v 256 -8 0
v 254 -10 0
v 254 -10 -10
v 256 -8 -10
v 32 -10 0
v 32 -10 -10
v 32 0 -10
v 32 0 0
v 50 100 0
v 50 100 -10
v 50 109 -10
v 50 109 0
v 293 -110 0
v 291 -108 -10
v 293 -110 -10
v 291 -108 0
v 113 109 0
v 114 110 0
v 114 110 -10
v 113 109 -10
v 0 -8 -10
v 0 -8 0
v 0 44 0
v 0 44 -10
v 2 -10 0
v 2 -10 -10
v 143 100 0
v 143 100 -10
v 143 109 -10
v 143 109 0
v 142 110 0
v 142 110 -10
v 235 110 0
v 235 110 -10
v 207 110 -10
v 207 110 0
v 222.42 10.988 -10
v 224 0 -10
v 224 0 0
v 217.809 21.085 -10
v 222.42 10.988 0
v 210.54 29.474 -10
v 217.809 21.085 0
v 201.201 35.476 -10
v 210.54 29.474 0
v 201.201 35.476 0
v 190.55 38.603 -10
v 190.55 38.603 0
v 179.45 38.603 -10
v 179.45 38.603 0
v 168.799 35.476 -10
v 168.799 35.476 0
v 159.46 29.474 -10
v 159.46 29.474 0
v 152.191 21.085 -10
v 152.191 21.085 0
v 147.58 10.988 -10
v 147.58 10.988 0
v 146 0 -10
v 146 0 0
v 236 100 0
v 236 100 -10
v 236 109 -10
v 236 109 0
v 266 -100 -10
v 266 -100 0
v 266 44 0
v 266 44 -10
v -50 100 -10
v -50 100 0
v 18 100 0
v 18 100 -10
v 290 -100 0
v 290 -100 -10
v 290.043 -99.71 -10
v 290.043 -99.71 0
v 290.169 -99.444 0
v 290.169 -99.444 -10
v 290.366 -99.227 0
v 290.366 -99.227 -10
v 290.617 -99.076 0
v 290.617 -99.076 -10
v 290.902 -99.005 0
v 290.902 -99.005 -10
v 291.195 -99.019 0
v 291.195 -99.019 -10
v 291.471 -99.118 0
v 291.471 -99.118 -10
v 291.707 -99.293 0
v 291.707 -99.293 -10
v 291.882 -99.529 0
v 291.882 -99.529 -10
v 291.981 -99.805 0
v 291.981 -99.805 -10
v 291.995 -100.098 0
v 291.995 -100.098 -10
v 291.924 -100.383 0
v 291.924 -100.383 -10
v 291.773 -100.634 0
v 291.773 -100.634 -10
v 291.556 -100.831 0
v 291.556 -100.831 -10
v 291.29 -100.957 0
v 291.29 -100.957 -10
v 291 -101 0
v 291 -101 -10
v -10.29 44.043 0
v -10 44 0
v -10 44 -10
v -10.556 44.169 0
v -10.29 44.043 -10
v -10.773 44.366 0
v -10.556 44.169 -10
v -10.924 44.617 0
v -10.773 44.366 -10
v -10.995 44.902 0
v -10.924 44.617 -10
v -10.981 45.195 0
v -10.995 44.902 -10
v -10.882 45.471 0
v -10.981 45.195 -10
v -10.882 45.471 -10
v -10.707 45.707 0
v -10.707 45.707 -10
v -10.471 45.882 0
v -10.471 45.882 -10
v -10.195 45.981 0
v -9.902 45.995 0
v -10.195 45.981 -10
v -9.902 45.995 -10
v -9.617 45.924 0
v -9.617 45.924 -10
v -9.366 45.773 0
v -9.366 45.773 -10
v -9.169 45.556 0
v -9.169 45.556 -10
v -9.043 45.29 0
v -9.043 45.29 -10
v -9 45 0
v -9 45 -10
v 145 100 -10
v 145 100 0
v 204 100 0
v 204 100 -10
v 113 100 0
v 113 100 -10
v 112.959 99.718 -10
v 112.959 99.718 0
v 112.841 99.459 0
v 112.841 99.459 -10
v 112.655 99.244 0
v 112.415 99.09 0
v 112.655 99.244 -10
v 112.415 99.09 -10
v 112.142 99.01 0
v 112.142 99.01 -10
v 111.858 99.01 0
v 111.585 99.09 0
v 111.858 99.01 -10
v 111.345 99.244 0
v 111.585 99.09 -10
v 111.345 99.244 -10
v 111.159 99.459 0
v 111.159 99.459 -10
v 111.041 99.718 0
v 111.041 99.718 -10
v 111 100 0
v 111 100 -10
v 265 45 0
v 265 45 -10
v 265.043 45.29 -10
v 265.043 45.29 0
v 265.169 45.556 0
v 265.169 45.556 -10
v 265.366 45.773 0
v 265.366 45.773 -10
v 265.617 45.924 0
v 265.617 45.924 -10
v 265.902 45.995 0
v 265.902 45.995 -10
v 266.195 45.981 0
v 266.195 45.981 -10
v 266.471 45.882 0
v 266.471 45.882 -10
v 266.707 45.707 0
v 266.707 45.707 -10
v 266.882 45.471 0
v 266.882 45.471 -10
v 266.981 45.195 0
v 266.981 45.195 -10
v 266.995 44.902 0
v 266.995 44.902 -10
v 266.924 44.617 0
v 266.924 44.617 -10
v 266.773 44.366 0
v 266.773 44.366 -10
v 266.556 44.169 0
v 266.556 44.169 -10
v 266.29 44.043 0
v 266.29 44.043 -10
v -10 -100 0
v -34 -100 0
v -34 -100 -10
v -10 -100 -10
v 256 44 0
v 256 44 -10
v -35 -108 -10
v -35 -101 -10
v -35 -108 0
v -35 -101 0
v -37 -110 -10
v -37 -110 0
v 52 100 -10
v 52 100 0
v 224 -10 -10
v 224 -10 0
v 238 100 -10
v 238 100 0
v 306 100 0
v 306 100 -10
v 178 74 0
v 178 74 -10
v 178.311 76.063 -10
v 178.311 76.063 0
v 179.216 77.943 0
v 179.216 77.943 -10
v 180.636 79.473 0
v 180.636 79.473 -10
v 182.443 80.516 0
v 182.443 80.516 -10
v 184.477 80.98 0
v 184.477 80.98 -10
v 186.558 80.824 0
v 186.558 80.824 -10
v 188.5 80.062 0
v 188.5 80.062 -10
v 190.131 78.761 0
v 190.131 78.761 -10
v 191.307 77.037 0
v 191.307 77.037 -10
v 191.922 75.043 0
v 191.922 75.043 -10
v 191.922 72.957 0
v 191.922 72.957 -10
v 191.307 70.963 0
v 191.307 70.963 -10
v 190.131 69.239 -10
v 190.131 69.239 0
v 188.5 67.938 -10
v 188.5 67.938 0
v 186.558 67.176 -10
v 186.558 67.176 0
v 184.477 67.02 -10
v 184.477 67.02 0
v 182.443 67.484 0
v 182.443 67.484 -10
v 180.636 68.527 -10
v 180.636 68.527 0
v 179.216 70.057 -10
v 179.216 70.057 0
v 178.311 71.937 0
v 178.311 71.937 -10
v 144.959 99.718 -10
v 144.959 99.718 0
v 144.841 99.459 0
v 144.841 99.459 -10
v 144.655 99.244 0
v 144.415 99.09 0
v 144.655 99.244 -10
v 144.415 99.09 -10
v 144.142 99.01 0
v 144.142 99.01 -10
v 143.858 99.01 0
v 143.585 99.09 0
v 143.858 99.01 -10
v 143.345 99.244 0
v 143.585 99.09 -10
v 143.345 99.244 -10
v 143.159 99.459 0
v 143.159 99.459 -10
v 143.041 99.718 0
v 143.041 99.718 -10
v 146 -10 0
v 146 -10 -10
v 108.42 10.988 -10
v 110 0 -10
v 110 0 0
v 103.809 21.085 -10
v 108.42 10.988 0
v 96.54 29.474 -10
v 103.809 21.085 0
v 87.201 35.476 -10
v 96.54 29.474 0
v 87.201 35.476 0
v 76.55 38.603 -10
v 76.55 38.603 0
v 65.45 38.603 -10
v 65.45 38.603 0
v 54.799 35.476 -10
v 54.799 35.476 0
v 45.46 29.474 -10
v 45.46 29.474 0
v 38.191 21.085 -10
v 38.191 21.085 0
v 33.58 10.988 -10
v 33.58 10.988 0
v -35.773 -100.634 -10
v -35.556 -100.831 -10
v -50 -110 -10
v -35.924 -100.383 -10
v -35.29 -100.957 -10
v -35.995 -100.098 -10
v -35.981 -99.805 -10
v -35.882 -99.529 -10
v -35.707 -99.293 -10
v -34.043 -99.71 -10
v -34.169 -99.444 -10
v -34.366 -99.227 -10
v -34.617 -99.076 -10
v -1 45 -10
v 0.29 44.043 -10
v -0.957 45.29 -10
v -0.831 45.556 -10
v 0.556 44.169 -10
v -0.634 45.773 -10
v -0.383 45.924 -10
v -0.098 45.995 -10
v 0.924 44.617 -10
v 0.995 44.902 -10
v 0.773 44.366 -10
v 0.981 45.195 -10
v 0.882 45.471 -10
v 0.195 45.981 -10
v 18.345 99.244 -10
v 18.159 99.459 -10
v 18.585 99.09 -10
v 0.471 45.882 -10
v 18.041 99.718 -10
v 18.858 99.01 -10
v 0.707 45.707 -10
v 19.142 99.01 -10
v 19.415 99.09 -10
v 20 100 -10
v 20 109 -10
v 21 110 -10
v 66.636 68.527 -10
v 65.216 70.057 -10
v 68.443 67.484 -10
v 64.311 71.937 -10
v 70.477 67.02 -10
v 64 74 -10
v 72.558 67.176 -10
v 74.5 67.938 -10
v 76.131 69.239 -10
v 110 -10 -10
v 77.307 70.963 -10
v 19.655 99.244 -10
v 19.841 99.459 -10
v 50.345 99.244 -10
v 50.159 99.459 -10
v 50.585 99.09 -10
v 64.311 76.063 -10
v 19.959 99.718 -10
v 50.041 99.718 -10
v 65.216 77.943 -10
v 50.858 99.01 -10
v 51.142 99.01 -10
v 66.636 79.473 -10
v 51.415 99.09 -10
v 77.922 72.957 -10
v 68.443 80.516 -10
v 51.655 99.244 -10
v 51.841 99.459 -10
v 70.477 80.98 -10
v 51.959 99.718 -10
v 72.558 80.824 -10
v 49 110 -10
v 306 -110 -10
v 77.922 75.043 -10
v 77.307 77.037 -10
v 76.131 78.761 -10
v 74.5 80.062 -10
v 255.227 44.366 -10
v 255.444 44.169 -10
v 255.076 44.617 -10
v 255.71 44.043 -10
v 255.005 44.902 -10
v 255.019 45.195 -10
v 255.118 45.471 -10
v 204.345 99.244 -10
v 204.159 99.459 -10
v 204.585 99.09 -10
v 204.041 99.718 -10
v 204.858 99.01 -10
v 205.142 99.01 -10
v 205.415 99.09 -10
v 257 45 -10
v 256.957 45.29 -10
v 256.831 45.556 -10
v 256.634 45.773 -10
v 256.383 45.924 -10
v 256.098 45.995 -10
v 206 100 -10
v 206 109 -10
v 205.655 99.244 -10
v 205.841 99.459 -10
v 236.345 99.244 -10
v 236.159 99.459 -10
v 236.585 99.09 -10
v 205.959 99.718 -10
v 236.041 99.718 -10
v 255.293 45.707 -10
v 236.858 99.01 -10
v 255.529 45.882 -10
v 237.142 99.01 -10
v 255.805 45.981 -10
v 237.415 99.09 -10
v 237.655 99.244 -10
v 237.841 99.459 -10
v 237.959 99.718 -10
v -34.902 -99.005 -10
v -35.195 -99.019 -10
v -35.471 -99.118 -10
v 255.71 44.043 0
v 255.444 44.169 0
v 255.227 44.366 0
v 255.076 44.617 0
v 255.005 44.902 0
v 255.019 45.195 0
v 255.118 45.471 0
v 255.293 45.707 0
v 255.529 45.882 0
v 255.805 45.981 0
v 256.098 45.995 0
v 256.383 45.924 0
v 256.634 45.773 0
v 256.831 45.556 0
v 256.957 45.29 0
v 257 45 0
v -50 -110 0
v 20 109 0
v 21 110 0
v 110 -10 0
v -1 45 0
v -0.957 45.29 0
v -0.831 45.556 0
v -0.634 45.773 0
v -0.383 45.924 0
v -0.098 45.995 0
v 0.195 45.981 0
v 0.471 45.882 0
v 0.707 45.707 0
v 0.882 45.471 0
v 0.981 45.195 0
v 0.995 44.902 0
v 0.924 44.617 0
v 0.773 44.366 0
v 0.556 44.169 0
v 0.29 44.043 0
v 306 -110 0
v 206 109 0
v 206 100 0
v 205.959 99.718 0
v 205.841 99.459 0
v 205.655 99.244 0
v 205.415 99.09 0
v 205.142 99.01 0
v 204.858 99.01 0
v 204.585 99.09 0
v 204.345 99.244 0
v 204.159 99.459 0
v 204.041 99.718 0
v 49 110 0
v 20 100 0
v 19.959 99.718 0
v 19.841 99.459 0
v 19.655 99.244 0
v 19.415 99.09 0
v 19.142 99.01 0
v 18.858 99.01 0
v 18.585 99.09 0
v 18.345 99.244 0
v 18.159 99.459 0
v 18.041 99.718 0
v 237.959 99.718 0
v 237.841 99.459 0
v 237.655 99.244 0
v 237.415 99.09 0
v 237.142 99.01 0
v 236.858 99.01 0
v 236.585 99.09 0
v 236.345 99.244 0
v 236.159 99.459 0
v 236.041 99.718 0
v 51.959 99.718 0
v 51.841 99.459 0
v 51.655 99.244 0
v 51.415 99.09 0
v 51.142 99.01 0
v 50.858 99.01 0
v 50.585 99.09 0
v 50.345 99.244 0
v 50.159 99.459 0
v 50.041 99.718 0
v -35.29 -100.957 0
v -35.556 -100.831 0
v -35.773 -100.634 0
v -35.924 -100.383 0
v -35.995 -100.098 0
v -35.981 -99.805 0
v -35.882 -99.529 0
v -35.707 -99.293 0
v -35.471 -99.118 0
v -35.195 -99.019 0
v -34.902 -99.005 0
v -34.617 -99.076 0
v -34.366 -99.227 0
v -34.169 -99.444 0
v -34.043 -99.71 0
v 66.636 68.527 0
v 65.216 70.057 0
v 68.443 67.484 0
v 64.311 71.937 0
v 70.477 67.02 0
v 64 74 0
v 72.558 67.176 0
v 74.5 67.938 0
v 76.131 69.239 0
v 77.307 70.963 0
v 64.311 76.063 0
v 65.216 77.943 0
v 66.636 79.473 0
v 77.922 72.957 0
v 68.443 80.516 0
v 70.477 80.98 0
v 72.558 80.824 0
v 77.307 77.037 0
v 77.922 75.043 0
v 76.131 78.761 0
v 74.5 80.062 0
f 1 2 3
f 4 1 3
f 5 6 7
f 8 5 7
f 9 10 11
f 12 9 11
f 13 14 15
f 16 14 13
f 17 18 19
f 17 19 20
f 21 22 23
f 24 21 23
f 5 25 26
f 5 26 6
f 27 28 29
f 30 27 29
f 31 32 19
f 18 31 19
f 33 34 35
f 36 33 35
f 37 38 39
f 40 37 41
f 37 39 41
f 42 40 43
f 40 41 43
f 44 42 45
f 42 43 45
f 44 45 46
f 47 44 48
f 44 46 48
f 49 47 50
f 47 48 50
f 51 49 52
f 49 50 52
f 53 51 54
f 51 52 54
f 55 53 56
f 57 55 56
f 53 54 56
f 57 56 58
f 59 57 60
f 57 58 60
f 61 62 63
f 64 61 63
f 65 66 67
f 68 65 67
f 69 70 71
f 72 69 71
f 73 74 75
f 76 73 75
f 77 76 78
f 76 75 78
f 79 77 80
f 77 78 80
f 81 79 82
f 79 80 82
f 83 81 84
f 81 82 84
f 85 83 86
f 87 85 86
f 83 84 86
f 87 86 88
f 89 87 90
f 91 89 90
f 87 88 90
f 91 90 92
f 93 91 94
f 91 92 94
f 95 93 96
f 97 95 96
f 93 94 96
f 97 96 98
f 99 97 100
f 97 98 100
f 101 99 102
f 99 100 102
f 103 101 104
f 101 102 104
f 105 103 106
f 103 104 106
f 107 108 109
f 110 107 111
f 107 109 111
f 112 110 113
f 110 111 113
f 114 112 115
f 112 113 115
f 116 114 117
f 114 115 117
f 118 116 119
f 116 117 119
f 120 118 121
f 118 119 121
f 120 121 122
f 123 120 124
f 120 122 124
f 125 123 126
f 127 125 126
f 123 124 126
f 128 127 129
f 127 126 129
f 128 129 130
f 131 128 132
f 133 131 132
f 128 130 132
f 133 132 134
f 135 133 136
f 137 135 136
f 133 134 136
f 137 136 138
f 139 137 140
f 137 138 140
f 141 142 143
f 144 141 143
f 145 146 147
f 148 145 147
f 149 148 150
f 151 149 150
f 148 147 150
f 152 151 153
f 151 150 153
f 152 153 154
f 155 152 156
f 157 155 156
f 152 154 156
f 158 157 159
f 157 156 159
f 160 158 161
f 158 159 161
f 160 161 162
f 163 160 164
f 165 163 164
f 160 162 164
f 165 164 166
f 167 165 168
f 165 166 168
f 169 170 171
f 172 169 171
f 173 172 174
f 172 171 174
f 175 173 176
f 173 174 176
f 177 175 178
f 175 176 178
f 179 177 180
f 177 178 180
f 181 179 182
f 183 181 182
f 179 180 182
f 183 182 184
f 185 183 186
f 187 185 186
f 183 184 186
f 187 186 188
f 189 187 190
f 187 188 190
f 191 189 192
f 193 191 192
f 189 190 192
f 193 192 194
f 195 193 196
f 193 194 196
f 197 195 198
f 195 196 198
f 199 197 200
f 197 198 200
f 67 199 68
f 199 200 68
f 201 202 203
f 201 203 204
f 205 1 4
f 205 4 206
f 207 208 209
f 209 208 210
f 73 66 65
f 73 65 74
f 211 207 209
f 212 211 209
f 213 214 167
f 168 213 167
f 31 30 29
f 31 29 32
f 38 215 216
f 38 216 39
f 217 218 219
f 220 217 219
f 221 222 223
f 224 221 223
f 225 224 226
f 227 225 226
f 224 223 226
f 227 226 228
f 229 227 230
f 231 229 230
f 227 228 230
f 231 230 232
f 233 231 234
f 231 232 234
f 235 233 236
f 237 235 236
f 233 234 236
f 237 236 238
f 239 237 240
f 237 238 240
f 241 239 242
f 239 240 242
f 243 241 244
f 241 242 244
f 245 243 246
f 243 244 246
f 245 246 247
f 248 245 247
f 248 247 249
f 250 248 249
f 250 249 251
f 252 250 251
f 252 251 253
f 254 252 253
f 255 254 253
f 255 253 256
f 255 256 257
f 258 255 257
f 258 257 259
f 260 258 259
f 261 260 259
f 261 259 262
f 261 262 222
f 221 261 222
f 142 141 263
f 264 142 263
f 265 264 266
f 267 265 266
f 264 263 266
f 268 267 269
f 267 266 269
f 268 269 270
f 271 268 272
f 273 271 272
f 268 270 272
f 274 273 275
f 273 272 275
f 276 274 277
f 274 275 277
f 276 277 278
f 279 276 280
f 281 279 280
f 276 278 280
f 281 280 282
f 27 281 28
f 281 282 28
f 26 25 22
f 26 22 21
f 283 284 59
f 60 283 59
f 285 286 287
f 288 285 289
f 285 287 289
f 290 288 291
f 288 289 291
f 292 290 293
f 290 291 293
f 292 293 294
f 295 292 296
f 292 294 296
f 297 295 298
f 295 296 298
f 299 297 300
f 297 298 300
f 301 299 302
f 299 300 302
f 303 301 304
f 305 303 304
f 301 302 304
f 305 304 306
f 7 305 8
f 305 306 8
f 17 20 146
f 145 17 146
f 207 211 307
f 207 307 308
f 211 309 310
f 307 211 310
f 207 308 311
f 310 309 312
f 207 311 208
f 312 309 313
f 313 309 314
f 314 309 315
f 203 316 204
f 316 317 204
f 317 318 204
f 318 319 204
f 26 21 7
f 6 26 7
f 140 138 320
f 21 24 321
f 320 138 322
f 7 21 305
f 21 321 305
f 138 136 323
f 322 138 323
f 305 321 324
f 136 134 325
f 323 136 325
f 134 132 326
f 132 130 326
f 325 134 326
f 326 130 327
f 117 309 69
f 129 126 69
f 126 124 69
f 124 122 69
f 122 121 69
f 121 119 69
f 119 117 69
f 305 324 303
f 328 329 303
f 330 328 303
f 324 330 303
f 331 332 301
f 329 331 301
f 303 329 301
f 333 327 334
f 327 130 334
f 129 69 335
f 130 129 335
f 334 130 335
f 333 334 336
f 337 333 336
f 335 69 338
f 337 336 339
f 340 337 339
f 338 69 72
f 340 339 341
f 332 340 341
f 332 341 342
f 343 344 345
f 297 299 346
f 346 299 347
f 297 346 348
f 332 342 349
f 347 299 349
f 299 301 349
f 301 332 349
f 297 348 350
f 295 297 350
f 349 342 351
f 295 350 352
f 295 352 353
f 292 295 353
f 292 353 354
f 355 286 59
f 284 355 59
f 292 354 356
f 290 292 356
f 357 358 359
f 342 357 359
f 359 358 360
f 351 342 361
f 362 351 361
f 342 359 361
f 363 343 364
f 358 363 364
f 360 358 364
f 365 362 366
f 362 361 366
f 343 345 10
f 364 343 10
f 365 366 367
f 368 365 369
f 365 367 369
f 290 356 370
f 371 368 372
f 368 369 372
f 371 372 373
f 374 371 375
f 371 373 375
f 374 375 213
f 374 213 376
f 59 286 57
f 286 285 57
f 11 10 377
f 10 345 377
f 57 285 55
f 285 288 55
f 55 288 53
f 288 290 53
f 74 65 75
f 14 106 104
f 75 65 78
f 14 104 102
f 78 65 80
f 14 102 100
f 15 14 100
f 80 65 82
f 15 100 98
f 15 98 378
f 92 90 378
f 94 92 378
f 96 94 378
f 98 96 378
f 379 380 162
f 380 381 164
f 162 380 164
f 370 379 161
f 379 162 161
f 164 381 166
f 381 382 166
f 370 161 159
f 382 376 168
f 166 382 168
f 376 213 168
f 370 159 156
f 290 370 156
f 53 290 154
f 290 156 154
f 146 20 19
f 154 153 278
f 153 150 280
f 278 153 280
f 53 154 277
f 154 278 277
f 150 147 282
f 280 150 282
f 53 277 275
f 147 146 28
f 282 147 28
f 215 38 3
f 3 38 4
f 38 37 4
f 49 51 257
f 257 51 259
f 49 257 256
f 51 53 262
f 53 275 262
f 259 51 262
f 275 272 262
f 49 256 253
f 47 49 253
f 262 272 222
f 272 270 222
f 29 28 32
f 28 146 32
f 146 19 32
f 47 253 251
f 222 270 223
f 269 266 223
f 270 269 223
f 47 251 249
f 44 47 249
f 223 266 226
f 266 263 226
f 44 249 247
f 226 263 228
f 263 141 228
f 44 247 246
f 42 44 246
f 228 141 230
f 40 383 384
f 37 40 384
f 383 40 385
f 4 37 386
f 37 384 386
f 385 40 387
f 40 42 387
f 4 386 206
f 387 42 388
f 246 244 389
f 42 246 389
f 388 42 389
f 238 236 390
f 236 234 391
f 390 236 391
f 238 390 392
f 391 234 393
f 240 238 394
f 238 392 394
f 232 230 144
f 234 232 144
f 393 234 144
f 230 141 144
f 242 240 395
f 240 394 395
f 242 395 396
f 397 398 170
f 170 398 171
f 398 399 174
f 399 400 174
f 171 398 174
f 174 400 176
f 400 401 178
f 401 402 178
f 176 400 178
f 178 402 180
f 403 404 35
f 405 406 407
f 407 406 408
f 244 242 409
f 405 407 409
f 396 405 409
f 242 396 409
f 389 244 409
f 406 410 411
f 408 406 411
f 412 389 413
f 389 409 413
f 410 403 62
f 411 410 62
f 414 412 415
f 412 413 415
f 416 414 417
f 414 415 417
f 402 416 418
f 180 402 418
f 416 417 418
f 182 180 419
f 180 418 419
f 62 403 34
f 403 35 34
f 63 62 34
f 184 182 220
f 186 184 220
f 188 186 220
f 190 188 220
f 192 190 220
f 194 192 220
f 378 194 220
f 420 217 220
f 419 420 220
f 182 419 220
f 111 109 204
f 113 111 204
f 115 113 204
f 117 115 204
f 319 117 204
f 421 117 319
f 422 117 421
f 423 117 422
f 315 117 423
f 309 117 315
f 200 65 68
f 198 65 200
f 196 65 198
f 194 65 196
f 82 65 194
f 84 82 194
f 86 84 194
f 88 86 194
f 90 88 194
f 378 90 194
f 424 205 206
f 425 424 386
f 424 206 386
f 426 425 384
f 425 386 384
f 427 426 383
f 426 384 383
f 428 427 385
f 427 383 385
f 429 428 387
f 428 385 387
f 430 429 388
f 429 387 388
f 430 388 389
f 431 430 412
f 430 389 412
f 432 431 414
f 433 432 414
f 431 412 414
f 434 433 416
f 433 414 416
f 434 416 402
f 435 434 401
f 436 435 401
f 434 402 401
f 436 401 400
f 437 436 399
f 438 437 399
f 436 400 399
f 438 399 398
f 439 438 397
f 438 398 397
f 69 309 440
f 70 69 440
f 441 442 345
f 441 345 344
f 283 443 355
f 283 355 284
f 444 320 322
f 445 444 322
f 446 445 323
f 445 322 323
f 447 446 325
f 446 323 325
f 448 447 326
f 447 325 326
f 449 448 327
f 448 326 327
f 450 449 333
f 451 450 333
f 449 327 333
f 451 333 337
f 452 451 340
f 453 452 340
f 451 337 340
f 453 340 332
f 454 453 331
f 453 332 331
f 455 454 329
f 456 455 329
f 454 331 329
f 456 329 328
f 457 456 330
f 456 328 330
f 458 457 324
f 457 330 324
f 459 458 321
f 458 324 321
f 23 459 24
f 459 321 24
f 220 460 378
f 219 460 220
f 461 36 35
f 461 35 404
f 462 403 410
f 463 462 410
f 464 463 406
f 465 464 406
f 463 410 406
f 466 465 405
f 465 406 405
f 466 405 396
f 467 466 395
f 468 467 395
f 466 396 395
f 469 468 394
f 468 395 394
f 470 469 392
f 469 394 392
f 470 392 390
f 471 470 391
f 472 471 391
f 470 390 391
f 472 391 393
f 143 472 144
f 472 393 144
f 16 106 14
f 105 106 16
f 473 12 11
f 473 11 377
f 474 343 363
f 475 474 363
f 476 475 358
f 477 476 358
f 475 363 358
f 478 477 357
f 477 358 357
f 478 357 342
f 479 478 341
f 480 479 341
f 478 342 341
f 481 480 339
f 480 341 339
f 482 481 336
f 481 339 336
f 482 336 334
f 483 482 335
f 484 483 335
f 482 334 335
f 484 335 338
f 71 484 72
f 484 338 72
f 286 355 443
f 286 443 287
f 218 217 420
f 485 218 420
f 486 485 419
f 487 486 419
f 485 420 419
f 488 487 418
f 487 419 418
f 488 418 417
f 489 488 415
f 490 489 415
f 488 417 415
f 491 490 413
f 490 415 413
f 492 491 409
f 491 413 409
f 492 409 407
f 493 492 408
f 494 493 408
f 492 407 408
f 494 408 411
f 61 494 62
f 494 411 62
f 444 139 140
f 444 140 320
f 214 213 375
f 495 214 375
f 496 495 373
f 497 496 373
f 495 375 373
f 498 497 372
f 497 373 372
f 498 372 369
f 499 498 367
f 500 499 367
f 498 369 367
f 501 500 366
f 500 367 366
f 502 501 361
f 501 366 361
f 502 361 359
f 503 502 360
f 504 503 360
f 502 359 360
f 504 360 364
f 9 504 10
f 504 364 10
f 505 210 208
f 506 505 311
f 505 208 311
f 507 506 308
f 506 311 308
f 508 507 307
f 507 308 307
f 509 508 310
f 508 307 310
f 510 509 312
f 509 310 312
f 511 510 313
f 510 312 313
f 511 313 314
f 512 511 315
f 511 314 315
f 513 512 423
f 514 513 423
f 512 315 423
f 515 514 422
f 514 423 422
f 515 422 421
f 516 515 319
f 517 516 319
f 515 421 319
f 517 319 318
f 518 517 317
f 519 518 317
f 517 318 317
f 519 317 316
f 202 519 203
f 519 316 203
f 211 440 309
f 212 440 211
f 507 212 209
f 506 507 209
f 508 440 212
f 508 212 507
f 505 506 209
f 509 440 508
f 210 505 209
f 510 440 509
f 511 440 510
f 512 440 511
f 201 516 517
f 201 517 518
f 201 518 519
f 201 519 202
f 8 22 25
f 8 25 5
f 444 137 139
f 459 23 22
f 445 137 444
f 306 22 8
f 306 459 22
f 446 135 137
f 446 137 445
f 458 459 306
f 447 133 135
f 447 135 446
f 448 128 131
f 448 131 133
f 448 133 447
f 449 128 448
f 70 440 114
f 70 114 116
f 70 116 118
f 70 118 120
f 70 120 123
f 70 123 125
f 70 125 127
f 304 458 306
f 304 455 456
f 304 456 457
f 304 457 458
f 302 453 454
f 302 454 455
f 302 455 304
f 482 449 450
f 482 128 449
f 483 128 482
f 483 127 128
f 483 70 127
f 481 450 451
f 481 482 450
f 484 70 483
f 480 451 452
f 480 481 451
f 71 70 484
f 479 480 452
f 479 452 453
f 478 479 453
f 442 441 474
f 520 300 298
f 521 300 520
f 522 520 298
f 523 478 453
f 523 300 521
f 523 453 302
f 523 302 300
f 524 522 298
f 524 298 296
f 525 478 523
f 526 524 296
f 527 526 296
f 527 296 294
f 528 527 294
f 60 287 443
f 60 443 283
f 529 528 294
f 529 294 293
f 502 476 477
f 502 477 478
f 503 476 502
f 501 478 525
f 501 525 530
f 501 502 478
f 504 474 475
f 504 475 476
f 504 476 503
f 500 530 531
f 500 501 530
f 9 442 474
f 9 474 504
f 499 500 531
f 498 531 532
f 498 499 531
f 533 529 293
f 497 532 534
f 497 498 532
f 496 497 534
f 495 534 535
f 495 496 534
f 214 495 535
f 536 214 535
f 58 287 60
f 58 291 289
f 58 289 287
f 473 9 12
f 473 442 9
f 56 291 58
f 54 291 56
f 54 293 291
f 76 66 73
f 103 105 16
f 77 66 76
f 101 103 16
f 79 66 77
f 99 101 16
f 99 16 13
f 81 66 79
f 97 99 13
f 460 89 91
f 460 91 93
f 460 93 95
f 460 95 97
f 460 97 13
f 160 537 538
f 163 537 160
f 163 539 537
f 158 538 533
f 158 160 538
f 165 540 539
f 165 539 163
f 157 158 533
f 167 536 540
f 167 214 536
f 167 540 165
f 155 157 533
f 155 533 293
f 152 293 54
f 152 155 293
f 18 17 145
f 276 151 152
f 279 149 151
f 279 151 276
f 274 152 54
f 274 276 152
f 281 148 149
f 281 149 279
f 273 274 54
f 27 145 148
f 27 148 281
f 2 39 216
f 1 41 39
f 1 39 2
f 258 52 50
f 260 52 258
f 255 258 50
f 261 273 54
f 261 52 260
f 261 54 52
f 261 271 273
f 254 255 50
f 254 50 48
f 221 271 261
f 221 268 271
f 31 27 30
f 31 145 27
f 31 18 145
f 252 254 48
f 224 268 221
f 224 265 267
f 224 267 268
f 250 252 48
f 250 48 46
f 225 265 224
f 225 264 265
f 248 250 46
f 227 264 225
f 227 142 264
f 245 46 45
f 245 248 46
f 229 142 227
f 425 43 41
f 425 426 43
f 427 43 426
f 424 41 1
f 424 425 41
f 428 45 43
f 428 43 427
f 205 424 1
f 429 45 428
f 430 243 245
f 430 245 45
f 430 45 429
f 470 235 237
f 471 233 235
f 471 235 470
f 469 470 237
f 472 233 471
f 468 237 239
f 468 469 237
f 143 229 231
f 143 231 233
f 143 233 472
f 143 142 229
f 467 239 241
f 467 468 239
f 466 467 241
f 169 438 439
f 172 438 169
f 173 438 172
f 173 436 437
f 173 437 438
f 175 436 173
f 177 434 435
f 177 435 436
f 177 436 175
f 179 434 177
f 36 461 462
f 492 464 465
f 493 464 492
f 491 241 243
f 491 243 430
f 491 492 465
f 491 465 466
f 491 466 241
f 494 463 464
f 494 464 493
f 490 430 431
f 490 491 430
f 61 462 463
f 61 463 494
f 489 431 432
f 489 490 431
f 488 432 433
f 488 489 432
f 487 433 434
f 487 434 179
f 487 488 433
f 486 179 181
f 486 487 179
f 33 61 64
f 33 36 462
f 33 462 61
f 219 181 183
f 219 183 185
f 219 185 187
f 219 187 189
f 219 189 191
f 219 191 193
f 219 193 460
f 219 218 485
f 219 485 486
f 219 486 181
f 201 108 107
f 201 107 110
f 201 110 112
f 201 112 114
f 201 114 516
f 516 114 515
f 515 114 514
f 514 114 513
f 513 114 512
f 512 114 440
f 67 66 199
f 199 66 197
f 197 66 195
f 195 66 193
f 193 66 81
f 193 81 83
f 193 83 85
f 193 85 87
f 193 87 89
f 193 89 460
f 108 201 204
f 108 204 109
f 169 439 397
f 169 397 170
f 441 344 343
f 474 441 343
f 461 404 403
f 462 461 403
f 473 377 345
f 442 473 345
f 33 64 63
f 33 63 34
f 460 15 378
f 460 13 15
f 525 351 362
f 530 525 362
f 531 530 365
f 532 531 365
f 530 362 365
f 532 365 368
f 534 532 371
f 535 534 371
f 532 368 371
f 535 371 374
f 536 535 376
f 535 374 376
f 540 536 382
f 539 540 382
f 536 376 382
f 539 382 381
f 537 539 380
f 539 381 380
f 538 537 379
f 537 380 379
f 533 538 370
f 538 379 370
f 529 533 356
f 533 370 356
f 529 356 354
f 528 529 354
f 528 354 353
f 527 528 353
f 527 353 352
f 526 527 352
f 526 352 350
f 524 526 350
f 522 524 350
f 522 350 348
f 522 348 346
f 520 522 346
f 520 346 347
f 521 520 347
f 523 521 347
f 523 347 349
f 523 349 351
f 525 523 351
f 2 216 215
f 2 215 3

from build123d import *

# Parameters (mm, degrees)
ESQUISSE1_W                               = 256
ESQUISSE1_H                               = 100
T_LE_DE_BASE_PLI_E1_DEPTH                 = 10
ESQUISSE15_W                              = 256
ESQUISSE15_H                              = 10
BOSS_EXTRU_3_DEPTH                        = 10
ENL_V_MAT_EXTRU_1_REACH                   = 277.02
ESQUISSE9_R                               = 39
SKETCH7_W                                 = 10
SKETCH7_H                                 = 55
EXTRUDE2_DEPTH                            = 10
SKETCH8_W                                 = 40
SKETCH8_H                                 = 200
EXTRUDE3_DEPTH                            = 10
ESQUISSE11_W                              = 15
ESQUISSE11_H                              = 10
BOSS_EXTRU_2_DEPTH                        = 10
TROU_POUR_TARAUDAGE_POUR_TROU_TARAUD_M1_D = 14
CHANFREIN1_SIZE                           = 2
TAB_START                                 = -10
TAB_AND_SLOT_TAB1_DEPTH                   = 10
DIAM_TRE_DU_PER_AGE_2_0_2_1_D             = 2
ENL_V_START                               = -10
ESQUISSE19_W                              = 78
ESQUISSE19_H                              = 10
ENL_V_MAT_EXTRU_2_DEPTH                   = 10


# Read off the part's stored shape, not the designer's step: Tab and Slot-Tab1
# Sheet-metal steps are written as plain solids
with BuildPart() as part:
    # Esquisse1 → Tôle de base pliée1 (new body)
    with BuildSketch(Plane.XY):
        with Locations((128, 50)):
            Rectangle(ESQUISSE1_W, ESQUISSE1_H)
    extrude(amount=-T_LE_DE_BASE_PLI_E1_DEPTH)

    # Esquisse15 → Boss.-Extru.3 (add)
    with BuildSketch(Plane.XY):
        with Locations((128, -5)):
            Rectangle(ESQUISSE15_W, ESQUISSE15_H)
    extrude(amount=-BOSS_EXTRU_3_DEPTH)

    # Esquisse9 → Enlèv. mat.-Extru.1 (cut, up to next)
    with BuildSketch(Plane.XY, mode=Mode.PRIVATE) as enl_v_mat_extru_1_sk1:
        with Locations((71, 0)):
            Circle(ESQUISSE9_R)
    enl_v_mat_extru_1_tool1 = extrude(enl_v_mat_extru_1_sk1.sketch, amount=-ENL_V_MAT_EXTRU_1_REACH, mode=Mode.PRIVATE) & part.part
    # Esquisse9 → Enlèv. mat.-Extru.1 (cut, up to next)
    with BuildSketch(Plane.XY, mode=Mode.PRIVATE) as enl_v_mat_extru_1_sk2:
        with Locations((185, 0)):
            Circle(ESQUISSE9_R)
    enl_v_mat_extru_1_tool2 = extrude(enl_v_mat_extru_1_sk2.sketch, amount=-ENL_V_MAT_EXTRU_1_REACH, mode=Mode.PRIVATE) & part.part
    add(enl_v_mat_extru_1_tool1.solids().sort_by_distance((71, 0, 0))[0], mode=Mode.SUBTRACT)
    add(enl_v_mat_extru_1_tool2.solids().sort_by_distance((185, 0, 0))[0], mode=Mode.SUBTRACT)

    # Sketch7 → Extrude2 (add)
    with BuildSketch(Plane.XY):
        with Locations((-5, 72.5)):
            Rectangle(SKETCH7_W, SKETCH7_H)
        with Locations((261, 72.5)):
            Rectangle(SKETCH7_W, SKETCH7_H)
    extrude(amount=-EXTRUDE2_DEPTH)

    # Sketch8 → Extrude3 (add)
    with BuildSketch(Plane.XY):
        with Locations((-30, 0)):
            Rectangle(SKETCH8_W, SKETCH8_H)
        with Locations((286, 0)):
            Rectangle(SKETCH8_W, SKETCH8_H)
    extrude(amount=-EXTRUDE3_DEPTH)

    # Esquisse11 → Boss.-Extru.2 (add)
    with BuildSketch(Plane.XZ.offset(100)):
        with Locations((-42.5, -5)):
            Rectangle(ESQUISSE11_W, ESQUISSE11_H)
        with Locations((298.5, -5)):
            Rectangle(ESQUISSE11_W, ESQUISSE11_H)
    extrude(amount=BOSS_EXTRU_2_DEPTH)

    # Trou pour taraudage pour trou taraudé M161 (through all)
    with Locations(Plane.XY):
        with Locations((71, 74), (185, 74)):
            Hole(TROU_POUR_TARAUDAGE_POUR_TROU_TARAUD_M1_D / 2)

    # Chanfrein1
    chanfrein1_edges = [part.edges().sort_by_distance(p)[0] for p in [
        (-35, -110, -5),
        (291, -110, -5),
        (0, -10, -5),
        (256, -10, -5),
    ]]
    chamfer(chanfrein1_edges, length=CHANFREIN1_SIZE)

    # Tab and Slot-Tab1 outline → Tab and Slot-Tab1 (add)
    with BuildSketch(Plane.XY.offset(TAB_START)):
        Polygon((50, 109), (49, 110), (21, 110), (20, 109), (20, 100), (50, 100), align=None)
        Polygon((206, 109), (206, 100), (236, 100), (236, 109), (235, 110), (207, 110), align=None)
        Polygon((113, 109), (113, 100), (143, 100), (143, 109), (142, 110), (114, 110), align=None)
    extrude(amount=TAB_AND_SLOT_TAB1_DEPTH)

    # Diamètre du perçage Ø2.0 (2)1 (through all)
    with Locations(Plane.XY):
        with Locations((-35, -100)):
            diam_tre_du_per_age_2_0_2_1 = Hole(DIAM_TRE_DU_PER_AGE_2_0_2_1_D / 2)

    # Répét. par esquisse1: Diamètre du perçage Ø2.0 (2)1 at 11 more places
    with Locations((54, 200, 0), (86, 200, 0), (147, 200, 0), (179, 200, 0), (240, 200, 0), (272, 200, 0), (301, 145, 0), (291, 145, 0), (326, 0, 0), (35, 145, 0), (25, 145, 0)):
        add(diam_tre_du_per_age_2_0_2_1, mode=Mode.SUBTRACT)

    # Esquisse19 → Enlèv. mat.-Extru.2 (cut)
    with BuildSketch(Plane.XY.offset(ENL_V_START)):
        with Locations((71, -5)):
            Rectangle(ESQUISSE19_W, ESQUISSE19_H)
        with Locations((185, -5)):
            Rectangle(ESQUISSE19_W, ESQUISSE19_H)
    extrude(amount=ENL_V_MAT_EXTRU_2_DEPTH, mode=Mode.SUBTRACT)


solid = part.part
